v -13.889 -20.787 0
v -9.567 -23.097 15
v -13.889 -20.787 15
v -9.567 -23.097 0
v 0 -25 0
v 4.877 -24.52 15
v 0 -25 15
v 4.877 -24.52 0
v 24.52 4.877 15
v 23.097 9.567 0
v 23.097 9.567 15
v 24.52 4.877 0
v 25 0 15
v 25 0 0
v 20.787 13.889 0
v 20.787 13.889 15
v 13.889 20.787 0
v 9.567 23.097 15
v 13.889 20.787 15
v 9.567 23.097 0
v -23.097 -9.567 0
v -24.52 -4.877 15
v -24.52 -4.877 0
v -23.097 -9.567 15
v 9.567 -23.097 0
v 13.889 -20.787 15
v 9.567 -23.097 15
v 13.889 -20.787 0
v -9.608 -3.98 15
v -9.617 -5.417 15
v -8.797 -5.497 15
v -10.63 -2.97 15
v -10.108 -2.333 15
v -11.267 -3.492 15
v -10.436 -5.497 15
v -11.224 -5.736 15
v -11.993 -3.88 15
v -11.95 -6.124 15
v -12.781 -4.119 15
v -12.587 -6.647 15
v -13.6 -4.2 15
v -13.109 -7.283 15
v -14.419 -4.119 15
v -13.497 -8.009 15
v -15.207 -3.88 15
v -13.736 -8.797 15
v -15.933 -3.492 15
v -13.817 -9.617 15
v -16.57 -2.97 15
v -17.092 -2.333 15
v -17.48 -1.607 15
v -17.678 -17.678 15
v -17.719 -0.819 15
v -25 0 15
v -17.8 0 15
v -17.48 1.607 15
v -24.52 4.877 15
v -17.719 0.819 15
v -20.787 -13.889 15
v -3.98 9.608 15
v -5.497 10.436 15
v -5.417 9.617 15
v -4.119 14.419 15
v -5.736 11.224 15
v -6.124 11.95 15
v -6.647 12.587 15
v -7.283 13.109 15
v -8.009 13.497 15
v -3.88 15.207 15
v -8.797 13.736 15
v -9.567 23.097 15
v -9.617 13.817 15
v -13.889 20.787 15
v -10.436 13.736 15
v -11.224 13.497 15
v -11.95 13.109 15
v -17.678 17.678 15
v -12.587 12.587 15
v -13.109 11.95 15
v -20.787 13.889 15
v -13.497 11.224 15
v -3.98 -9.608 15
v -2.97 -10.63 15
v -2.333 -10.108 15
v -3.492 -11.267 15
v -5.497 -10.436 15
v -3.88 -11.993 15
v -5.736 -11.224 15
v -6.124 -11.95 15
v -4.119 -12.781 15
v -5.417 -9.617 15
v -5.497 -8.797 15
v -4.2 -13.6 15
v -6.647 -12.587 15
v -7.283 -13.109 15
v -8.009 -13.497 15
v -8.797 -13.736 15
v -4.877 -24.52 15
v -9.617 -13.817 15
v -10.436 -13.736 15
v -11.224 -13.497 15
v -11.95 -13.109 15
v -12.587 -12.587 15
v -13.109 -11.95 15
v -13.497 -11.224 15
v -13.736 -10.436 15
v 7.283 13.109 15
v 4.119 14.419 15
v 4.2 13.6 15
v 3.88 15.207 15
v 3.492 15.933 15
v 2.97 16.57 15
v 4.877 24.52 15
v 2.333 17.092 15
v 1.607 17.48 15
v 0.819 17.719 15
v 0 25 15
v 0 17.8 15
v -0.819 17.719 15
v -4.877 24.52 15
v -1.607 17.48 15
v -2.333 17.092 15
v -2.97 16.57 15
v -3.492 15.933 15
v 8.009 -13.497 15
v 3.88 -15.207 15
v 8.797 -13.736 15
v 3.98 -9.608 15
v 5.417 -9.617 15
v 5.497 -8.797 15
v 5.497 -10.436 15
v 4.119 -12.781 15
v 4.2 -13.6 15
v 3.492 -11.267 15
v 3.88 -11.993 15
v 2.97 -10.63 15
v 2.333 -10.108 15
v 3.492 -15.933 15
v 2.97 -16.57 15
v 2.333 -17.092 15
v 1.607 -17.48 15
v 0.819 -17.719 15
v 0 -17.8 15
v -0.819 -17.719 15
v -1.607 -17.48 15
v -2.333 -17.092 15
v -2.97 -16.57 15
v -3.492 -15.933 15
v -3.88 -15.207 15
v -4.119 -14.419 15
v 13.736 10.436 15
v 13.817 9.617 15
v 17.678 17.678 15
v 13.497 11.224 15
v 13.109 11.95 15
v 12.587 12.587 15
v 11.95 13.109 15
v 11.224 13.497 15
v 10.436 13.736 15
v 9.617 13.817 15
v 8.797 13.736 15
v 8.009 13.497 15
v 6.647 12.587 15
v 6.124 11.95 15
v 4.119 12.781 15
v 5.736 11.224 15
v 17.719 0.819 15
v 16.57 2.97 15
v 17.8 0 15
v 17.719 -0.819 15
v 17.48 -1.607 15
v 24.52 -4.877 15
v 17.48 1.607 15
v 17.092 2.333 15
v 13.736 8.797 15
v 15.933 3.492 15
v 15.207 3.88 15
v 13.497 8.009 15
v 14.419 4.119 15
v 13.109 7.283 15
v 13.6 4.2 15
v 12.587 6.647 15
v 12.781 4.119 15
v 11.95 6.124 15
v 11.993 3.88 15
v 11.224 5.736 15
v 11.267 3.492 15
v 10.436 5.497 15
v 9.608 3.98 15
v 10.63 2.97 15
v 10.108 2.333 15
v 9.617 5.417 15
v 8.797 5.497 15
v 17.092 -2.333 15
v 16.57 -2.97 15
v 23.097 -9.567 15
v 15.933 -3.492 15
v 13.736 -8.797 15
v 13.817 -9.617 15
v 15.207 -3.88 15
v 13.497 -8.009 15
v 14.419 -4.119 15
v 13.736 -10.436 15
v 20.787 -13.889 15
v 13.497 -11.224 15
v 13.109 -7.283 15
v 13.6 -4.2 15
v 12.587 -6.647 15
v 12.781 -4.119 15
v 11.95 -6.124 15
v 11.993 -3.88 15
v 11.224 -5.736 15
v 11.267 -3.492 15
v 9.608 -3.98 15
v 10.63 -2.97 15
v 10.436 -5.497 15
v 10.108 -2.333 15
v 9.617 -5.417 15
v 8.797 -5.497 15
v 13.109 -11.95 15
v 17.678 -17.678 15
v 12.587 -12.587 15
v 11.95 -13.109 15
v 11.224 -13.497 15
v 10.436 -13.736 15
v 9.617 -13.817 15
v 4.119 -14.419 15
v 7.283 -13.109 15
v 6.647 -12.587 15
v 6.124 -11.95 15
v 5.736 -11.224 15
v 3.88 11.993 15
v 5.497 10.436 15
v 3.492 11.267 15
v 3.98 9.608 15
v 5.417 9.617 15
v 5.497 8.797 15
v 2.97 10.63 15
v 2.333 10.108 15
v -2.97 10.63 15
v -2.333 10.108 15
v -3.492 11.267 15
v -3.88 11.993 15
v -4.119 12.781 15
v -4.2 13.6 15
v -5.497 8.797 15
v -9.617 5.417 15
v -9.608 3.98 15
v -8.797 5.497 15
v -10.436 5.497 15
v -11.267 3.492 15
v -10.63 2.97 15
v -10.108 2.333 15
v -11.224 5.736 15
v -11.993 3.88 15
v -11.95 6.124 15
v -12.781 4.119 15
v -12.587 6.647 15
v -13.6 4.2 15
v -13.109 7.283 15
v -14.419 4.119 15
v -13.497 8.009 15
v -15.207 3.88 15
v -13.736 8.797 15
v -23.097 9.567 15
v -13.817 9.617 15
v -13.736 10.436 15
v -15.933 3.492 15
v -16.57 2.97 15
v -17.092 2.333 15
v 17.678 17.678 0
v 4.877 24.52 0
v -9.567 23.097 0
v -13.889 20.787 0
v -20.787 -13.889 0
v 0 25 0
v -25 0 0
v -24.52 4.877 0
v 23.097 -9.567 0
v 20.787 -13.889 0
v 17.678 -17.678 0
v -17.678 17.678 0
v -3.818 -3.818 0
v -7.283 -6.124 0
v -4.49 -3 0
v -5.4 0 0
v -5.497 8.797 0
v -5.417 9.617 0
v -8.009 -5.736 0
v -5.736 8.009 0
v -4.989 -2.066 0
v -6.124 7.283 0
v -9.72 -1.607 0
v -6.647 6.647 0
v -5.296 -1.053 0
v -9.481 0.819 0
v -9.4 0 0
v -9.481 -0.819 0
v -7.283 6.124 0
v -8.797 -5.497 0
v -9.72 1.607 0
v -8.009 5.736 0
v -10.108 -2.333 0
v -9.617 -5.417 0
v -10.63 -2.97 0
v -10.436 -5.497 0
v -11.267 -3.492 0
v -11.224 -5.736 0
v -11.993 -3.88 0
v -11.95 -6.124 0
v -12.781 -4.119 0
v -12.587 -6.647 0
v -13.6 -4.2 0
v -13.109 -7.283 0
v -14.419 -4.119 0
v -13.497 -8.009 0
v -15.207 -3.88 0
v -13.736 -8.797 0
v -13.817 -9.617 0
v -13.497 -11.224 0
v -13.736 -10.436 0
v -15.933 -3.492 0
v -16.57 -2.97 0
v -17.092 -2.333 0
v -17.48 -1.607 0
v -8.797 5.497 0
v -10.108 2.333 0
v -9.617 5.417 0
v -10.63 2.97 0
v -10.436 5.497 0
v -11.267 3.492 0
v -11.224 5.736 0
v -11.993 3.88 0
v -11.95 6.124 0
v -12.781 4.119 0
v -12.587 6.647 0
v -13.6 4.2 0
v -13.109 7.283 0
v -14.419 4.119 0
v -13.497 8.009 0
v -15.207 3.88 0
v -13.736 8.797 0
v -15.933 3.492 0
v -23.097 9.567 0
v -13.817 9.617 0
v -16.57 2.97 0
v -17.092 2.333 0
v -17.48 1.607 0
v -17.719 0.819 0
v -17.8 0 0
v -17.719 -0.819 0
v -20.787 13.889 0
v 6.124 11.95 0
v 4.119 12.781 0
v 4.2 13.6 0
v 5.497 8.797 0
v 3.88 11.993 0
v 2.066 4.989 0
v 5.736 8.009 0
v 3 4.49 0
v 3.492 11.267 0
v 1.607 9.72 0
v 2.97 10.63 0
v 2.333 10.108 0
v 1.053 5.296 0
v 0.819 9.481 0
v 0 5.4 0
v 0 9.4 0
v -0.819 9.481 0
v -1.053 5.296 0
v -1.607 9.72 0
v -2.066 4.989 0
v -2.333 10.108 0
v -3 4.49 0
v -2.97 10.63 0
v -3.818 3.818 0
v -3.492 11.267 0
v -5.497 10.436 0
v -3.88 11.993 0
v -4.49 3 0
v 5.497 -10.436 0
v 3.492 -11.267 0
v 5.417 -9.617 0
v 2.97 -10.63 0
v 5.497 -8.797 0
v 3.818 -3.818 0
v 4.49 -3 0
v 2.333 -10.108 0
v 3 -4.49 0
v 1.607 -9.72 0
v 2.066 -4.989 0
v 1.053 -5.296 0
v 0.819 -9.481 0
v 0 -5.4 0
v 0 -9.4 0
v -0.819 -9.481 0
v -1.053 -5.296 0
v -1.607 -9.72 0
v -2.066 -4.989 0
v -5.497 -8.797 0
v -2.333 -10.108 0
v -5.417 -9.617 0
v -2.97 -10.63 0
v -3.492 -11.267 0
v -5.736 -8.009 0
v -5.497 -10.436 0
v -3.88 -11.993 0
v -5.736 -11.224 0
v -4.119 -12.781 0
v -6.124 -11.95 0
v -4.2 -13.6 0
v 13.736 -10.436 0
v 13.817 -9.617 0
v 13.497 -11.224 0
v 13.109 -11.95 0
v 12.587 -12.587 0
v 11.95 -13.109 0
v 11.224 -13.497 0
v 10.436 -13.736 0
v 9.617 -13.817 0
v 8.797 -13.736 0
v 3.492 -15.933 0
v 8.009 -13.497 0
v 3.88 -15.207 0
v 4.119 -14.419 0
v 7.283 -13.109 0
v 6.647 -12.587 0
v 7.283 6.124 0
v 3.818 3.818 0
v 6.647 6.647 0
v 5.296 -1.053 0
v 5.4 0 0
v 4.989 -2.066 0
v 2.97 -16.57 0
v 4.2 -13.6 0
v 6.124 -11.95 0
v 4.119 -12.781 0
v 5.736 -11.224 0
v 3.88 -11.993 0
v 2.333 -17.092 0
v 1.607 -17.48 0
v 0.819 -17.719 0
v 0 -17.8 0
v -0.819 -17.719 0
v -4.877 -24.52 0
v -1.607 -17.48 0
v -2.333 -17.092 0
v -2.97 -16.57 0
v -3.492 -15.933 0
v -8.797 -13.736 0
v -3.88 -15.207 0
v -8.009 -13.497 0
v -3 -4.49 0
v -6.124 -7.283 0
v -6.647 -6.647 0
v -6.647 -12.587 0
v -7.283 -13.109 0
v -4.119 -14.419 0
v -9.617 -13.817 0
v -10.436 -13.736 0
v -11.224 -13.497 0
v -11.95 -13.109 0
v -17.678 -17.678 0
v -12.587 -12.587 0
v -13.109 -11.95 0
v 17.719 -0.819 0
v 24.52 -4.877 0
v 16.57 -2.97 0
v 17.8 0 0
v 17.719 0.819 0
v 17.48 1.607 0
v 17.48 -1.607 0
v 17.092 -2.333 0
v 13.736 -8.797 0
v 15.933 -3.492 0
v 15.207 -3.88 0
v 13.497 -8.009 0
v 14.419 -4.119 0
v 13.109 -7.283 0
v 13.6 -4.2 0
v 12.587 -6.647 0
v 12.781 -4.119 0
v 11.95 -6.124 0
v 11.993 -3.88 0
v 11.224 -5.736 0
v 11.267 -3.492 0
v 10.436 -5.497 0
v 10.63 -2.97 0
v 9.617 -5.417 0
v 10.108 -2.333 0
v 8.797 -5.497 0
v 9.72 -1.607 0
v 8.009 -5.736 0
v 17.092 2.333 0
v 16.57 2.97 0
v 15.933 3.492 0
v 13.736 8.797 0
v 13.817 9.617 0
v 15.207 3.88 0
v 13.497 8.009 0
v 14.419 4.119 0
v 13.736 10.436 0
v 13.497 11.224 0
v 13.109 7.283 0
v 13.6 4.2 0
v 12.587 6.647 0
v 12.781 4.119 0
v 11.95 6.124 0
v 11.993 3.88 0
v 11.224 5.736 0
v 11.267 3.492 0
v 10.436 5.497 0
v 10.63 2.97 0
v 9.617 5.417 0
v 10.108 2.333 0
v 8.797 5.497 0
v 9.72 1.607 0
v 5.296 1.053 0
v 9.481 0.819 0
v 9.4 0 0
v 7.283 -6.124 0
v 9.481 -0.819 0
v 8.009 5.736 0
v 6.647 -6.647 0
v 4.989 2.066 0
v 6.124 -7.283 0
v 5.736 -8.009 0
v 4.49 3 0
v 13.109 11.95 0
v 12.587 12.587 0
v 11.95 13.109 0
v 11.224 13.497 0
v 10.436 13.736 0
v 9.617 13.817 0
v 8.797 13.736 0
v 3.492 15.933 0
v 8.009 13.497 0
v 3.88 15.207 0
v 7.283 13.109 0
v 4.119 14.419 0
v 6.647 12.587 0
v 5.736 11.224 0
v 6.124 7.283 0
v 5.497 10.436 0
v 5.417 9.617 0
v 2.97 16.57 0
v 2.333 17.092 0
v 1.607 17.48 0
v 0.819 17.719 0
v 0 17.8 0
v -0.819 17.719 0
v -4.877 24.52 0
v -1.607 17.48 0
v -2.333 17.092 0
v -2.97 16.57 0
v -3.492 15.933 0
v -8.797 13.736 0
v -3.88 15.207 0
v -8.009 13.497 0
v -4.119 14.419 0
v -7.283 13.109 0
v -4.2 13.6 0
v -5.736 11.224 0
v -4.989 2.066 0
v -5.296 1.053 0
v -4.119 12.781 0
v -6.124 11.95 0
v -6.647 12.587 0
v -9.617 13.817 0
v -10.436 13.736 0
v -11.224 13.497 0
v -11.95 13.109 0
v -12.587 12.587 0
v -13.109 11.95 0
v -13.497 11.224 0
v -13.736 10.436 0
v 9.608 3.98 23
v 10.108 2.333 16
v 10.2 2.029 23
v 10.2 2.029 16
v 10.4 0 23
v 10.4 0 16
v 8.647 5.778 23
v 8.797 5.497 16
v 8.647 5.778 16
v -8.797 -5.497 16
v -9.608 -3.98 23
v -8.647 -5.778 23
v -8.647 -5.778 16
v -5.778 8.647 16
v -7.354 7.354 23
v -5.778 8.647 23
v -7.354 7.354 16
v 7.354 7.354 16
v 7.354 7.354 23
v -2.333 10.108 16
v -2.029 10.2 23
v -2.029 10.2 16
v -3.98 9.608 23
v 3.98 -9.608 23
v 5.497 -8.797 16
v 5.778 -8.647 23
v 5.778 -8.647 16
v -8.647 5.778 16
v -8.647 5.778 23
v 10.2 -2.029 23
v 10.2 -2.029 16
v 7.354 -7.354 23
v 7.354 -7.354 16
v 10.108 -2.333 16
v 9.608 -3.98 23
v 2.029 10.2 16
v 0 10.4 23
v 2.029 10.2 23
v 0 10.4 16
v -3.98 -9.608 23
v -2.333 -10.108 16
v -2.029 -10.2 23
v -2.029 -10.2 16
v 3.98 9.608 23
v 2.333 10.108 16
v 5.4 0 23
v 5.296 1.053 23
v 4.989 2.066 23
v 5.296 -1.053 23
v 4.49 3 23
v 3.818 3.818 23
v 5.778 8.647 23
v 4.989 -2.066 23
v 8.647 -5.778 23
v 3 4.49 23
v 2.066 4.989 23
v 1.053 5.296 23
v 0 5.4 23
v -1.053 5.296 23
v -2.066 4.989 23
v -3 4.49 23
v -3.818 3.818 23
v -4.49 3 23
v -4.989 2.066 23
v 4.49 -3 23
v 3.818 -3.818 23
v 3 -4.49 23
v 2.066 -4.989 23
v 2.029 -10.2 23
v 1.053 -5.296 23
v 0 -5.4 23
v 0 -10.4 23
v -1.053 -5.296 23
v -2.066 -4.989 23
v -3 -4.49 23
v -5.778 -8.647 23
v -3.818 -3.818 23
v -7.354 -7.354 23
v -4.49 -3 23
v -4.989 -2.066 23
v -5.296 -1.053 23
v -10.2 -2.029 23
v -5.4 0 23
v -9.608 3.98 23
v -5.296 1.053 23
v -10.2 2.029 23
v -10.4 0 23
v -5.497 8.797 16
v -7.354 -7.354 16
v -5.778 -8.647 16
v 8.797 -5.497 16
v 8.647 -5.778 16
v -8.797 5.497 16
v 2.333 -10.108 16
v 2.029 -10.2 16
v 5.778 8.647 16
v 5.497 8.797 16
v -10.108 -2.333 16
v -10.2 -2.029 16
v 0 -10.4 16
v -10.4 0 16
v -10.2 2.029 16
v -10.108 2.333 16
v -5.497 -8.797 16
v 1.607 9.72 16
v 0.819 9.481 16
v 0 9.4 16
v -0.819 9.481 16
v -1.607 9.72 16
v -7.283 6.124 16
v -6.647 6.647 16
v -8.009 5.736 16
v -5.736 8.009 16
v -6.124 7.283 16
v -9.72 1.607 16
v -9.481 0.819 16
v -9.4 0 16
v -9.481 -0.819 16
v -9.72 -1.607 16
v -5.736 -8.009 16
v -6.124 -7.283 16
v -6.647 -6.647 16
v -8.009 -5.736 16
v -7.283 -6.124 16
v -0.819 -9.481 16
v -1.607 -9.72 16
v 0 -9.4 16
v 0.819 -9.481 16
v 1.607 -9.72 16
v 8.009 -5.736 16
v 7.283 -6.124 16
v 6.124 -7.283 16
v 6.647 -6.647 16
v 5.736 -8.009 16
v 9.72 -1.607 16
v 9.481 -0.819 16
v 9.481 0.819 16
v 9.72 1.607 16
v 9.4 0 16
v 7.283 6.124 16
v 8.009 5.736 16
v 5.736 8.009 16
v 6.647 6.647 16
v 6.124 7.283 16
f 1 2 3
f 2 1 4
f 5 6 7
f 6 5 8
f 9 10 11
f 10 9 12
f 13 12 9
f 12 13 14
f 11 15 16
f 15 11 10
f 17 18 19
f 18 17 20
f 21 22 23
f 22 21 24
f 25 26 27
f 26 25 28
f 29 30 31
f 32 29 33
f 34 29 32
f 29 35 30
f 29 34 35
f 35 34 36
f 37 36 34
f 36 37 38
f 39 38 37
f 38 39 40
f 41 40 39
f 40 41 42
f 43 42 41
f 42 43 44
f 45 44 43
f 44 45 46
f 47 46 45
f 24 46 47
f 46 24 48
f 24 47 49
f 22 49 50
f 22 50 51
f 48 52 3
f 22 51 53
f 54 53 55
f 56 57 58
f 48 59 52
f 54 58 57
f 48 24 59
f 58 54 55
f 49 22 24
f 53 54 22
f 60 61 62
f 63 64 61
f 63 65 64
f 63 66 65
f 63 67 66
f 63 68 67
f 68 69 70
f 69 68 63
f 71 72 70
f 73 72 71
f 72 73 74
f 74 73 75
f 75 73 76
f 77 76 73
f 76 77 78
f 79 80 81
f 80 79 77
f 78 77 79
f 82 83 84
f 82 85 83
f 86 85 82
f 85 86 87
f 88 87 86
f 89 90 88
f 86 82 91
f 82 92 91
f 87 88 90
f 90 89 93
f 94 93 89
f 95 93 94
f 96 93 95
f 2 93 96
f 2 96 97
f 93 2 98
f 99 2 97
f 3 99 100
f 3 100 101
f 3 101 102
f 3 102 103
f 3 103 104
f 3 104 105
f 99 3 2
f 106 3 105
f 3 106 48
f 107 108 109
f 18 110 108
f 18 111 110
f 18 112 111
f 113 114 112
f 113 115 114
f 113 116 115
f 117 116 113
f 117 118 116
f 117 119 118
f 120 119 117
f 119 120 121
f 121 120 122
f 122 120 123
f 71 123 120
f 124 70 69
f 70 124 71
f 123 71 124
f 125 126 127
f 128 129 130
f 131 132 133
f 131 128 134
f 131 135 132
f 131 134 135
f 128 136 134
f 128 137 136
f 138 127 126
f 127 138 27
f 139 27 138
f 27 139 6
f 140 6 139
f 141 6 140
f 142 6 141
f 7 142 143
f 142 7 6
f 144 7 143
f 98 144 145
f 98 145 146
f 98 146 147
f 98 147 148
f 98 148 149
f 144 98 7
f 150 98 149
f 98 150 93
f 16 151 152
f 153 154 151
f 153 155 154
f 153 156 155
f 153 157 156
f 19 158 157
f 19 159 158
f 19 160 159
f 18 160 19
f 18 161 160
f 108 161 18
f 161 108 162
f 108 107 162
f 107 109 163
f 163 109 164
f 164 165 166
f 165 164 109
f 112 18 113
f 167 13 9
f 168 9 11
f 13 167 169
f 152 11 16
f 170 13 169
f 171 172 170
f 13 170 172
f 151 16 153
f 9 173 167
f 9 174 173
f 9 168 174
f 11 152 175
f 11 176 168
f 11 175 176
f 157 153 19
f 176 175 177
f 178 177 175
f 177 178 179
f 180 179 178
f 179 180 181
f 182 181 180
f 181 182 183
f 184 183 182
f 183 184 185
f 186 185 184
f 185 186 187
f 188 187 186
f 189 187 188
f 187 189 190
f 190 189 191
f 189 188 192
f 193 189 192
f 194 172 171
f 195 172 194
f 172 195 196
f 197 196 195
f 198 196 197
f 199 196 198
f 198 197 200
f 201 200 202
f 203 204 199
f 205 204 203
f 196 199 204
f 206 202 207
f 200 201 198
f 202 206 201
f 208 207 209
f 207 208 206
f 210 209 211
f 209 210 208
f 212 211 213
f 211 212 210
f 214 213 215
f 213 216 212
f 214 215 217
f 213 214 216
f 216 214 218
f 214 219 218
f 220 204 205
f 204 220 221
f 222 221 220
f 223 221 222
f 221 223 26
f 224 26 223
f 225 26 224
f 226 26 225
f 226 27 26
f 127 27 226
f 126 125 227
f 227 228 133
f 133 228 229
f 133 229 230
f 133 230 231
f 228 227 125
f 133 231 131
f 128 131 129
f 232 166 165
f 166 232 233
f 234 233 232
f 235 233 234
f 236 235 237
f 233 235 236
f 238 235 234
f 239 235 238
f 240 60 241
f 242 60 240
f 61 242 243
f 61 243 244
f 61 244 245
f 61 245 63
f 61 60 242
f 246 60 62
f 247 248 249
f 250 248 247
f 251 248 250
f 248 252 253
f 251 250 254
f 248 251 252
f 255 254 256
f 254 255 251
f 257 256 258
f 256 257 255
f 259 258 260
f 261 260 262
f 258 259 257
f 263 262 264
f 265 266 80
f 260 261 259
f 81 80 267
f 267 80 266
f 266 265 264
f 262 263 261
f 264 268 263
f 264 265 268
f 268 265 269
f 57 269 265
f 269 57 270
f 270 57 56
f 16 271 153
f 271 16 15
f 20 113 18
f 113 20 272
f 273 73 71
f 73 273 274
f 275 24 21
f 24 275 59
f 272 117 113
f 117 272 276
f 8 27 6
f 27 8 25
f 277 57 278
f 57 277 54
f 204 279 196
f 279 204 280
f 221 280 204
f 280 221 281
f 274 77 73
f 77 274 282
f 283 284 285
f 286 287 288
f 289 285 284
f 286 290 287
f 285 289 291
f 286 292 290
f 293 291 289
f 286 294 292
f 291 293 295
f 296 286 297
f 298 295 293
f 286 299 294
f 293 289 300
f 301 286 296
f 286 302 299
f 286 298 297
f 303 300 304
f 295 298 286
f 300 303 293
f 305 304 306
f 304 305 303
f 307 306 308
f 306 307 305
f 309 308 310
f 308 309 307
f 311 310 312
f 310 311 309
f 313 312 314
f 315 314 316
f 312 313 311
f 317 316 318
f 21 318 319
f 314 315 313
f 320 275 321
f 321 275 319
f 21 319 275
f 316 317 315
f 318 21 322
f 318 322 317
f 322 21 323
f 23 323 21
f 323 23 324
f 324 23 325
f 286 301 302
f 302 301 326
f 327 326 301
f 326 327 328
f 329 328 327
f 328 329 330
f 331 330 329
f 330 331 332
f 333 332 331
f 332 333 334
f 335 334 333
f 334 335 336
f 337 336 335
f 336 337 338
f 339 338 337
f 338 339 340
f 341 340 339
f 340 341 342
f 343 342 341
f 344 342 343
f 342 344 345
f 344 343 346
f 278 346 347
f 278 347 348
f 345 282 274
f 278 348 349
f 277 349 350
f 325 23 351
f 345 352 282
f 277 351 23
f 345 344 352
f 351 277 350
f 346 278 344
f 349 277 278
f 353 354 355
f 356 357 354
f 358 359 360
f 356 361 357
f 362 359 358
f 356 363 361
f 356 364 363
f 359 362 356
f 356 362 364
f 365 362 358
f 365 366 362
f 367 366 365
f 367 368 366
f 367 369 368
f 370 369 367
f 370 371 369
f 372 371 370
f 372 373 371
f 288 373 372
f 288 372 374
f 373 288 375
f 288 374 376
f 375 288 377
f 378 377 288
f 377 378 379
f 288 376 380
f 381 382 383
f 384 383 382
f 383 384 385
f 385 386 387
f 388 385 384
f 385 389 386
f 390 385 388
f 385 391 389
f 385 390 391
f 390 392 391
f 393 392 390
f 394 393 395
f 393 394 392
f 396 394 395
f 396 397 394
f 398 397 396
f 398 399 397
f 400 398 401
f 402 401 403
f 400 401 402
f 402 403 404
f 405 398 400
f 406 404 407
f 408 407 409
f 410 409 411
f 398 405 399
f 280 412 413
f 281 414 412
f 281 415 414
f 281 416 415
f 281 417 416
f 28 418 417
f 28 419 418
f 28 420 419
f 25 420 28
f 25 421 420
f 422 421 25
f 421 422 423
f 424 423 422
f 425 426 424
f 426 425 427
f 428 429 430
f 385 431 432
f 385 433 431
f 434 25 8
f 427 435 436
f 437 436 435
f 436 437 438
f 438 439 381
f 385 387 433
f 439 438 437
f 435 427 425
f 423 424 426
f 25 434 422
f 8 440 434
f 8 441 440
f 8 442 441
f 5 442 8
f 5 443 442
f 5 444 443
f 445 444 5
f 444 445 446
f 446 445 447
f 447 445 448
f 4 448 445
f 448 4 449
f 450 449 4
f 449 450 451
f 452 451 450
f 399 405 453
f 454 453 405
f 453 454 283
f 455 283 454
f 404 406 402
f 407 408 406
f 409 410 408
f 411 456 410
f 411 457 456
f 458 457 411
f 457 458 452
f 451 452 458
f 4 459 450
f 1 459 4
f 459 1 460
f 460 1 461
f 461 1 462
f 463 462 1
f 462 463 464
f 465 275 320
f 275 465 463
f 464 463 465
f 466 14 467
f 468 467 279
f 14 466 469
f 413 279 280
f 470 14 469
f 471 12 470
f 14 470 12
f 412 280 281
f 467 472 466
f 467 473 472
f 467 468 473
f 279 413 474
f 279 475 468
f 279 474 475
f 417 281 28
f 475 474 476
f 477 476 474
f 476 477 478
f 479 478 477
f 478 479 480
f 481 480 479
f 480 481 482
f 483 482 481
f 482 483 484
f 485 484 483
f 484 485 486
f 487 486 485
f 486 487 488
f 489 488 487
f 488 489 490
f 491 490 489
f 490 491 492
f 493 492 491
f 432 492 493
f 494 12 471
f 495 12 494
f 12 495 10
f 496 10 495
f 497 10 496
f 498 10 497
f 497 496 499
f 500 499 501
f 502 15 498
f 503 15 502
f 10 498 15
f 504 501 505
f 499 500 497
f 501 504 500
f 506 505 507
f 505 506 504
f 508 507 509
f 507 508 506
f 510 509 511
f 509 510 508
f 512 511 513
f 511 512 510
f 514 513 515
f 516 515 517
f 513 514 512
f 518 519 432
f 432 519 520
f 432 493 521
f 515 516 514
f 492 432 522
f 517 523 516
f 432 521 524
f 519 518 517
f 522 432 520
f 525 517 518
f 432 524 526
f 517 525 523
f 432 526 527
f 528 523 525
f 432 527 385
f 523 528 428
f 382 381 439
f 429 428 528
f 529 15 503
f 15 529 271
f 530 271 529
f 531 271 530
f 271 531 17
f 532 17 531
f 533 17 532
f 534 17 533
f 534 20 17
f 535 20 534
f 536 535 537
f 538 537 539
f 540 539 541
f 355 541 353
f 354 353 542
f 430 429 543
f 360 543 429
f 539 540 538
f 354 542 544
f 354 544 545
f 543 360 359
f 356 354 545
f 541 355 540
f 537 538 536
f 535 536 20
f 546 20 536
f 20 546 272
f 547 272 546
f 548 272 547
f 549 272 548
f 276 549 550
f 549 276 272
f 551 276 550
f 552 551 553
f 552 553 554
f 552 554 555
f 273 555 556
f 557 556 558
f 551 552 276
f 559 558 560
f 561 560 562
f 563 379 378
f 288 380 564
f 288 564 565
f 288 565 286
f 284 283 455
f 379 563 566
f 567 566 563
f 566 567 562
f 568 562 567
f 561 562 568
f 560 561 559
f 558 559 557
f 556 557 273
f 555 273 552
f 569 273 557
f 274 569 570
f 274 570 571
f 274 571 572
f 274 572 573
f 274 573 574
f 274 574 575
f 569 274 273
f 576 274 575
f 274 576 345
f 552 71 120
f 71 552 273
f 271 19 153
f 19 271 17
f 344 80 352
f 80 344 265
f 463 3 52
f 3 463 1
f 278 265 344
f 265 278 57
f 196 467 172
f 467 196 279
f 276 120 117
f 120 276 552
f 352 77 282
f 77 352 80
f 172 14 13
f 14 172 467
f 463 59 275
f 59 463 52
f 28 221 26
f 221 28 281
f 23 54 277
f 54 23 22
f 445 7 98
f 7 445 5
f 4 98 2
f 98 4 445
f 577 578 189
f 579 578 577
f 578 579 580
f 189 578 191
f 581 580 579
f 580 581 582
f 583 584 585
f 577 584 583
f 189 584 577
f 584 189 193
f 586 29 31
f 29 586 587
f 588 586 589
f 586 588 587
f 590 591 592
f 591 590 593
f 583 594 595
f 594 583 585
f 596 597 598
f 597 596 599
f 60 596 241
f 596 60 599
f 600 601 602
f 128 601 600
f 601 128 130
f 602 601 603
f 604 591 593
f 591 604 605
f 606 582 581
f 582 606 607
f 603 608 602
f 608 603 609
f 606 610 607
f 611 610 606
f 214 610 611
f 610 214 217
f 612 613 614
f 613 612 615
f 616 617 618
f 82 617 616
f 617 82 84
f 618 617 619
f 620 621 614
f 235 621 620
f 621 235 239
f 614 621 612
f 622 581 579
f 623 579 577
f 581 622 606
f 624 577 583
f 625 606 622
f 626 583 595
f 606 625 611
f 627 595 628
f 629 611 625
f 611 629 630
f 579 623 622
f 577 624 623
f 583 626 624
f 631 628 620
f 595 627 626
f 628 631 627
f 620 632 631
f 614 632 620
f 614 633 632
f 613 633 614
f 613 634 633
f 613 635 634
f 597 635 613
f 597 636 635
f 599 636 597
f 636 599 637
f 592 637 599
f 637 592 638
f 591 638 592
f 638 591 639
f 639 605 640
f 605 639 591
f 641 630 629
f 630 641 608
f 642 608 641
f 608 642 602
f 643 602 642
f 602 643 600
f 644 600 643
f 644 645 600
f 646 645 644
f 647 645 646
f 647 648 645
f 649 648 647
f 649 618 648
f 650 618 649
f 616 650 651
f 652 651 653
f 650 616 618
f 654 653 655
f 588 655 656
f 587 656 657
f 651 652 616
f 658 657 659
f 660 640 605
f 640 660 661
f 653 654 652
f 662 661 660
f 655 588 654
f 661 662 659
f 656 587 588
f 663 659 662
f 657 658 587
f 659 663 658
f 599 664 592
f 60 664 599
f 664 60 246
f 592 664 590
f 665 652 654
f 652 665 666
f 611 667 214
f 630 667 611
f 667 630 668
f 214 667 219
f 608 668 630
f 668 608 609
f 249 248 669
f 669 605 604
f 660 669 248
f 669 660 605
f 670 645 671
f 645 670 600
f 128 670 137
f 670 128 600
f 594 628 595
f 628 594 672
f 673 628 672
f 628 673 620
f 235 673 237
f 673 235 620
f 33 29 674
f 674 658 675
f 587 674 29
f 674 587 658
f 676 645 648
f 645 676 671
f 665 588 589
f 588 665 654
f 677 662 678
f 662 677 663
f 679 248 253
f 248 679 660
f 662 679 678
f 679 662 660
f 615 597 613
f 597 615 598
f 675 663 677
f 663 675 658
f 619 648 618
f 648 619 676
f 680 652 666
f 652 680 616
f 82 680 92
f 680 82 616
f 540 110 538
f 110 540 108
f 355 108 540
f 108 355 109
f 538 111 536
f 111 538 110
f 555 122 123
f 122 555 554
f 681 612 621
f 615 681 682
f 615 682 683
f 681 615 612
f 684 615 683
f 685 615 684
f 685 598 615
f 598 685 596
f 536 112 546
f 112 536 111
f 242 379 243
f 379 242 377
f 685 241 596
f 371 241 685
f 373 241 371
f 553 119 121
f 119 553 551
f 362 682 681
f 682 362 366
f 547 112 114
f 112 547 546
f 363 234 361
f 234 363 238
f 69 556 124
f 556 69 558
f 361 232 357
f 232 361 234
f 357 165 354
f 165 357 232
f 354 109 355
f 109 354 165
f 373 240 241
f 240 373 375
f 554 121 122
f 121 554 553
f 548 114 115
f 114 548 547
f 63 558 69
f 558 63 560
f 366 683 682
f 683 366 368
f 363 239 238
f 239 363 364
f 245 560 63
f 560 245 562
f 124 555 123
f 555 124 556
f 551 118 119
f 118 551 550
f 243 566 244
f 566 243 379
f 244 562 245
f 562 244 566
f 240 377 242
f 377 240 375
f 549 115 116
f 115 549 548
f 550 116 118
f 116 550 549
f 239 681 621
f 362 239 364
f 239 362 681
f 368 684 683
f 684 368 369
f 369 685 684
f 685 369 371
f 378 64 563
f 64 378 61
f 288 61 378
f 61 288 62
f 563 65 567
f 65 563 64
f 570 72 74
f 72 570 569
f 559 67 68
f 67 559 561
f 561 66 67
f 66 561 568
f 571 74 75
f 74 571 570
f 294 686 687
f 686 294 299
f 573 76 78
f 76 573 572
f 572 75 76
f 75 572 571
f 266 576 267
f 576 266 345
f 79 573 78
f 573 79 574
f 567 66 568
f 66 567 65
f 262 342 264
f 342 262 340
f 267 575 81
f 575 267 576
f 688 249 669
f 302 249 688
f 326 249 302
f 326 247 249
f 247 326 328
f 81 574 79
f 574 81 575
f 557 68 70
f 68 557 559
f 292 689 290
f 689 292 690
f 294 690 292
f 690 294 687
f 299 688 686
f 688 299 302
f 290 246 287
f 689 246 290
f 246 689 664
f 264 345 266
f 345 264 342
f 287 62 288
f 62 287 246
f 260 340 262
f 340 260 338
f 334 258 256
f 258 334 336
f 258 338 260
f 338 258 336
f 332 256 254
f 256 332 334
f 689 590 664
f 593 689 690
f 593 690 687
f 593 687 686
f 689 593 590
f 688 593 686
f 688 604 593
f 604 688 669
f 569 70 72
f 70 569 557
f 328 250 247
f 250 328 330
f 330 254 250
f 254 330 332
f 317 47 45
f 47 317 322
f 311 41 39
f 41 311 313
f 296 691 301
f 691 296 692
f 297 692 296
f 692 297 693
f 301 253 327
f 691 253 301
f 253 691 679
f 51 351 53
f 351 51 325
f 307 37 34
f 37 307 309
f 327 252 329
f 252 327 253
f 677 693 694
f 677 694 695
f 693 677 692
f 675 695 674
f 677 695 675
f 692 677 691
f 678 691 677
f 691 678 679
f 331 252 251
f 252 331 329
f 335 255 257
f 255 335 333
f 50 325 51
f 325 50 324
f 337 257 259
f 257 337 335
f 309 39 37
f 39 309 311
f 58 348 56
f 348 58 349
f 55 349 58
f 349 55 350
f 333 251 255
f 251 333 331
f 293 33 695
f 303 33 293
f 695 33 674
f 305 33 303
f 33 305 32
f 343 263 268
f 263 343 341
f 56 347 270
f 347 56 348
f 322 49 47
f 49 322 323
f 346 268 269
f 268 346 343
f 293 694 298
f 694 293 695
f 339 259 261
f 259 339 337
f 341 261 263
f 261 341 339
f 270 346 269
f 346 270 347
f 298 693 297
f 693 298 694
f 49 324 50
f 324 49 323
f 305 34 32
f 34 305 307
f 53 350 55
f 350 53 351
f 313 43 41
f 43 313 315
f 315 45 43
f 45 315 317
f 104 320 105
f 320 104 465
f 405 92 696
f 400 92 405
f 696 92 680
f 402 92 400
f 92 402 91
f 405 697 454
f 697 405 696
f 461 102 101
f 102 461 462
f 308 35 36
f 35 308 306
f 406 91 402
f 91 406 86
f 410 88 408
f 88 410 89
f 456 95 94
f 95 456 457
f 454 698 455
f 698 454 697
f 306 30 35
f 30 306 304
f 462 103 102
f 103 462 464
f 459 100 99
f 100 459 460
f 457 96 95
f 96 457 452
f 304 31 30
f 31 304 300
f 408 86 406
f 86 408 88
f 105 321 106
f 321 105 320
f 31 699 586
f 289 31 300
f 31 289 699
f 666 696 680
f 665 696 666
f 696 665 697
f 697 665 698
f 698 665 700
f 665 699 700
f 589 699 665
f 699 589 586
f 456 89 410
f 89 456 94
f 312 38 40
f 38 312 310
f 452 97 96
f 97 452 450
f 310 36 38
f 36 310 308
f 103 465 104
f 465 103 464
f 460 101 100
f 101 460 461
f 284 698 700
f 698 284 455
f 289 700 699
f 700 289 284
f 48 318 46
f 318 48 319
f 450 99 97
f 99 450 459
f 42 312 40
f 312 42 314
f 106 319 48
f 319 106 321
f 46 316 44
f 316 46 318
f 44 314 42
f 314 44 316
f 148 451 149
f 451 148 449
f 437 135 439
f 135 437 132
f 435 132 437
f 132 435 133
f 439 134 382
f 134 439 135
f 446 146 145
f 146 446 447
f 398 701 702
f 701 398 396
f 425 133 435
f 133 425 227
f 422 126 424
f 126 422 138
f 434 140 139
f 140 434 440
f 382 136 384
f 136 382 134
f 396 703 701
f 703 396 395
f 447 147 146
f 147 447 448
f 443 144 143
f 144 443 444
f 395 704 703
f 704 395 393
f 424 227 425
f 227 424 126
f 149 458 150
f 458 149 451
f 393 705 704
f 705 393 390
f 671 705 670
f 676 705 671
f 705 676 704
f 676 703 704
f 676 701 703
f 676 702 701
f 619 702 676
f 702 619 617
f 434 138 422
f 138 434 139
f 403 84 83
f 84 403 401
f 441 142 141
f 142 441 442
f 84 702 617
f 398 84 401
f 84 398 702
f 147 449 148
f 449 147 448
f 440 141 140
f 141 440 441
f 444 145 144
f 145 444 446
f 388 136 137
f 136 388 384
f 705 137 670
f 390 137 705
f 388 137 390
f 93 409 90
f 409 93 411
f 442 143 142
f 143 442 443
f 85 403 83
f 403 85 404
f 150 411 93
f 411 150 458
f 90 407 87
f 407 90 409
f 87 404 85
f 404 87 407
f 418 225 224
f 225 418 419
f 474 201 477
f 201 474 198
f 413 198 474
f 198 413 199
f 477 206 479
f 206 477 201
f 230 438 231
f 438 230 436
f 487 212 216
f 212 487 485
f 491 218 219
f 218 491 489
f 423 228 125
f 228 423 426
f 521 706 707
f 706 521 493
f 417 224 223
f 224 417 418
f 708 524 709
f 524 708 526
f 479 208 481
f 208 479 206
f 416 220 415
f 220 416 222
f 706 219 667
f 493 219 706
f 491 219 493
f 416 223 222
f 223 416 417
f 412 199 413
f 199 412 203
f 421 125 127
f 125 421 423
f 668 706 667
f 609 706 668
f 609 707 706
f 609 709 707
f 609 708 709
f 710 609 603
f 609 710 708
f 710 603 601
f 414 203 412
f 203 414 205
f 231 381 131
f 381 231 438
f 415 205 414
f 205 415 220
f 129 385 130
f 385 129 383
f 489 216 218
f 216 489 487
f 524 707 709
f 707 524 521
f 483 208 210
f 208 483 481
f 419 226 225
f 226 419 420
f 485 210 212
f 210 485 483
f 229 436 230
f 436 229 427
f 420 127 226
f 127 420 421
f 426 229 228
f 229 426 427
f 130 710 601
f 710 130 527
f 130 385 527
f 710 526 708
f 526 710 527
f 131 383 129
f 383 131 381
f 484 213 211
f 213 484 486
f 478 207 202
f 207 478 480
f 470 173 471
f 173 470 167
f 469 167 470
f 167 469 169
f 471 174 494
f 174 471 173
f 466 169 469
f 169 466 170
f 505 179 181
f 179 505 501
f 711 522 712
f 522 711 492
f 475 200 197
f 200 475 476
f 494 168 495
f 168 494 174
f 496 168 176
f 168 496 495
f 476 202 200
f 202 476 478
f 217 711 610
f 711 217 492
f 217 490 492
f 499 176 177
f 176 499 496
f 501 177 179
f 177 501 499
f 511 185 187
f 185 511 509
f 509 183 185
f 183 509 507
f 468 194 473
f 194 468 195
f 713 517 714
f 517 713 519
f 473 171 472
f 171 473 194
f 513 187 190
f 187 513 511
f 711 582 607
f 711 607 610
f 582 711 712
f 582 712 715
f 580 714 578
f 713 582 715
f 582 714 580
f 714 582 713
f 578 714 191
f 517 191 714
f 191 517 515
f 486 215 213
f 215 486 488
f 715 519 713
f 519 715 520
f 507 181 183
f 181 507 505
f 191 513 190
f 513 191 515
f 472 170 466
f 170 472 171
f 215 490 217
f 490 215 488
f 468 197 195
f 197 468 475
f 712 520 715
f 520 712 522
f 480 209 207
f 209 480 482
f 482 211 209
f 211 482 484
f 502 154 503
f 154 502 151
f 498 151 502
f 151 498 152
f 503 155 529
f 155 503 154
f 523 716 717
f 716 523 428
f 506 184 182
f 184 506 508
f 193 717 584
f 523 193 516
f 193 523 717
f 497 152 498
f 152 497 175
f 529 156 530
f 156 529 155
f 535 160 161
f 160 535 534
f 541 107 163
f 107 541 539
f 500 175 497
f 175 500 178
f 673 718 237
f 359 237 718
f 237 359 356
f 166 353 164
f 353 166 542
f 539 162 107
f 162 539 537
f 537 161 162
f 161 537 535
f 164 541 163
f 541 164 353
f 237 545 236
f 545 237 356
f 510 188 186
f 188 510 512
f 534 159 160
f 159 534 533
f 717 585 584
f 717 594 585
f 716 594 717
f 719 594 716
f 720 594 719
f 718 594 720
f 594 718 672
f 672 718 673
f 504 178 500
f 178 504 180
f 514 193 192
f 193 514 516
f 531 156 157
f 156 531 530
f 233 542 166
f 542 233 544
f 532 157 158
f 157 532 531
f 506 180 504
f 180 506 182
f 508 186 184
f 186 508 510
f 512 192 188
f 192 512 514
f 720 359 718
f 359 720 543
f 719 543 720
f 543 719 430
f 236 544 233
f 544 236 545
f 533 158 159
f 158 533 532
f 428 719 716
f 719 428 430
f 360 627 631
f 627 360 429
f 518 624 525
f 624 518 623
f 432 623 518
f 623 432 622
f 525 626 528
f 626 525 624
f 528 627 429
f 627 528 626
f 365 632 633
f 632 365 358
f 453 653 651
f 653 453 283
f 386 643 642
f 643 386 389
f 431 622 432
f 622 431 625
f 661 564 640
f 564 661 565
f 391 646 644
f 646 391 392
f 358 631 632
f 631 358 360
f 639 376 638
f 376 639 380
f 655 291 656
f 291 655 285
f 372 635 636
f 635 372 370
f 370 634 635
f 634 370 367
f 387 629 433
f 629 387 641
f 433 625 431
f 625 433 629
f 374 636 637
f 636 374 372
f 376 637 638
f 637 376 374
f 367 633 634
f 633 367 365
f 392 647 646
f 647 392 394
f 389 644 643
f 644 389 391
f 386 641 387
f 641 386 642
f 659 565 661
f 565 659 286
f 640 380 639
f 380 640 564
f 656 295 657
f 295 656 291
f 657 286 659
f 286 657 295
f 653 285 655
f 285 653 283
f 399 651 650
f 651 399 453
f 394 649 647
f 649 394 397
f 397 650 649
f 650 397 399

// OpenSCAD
$fn = 32;

// ----------------------------------------------------------------------
// Flange Ø50 x 15
// 8 holes on a Ø27.2 bolt circle, bolted joints
// ----------------------------------------------------------------------

// --- parameters (mm) ---
flange_d = 50;   // outside diameter of the flange
thickness = 15;  // flange thickness
holes = 8;       // number of bolt holes
pcd = 27.2;      // bolt circle diameter
start_deg = 90;  // angle of the first hole, from +X
hole_d = 8.4;    // bolt hole diameter
bore_d = 10.8;   // central through bore
hub_d = 20.8;    // hub outside diameter
hub_h = 8;       // hub height above the flange face (0 = no hub)

// --- derived feature positions (mm) ---
height = thickness + hub_h;  // = 23   overall height of the part
pcd_r = pcd / 2;             // = 13.6   bolt circle radius
hole_step = 360 / holes;     // = 45   angular pitch
feature_centers = [
  [pcd_r * cos(start_deg + 0 * hole_step), pcd_r * sin(start_deg + 0 * hole_step)],
  [pcd_r * cos(start_deg + 1 * hole_step), pcd_r * sin(start_deg + 1 * hole_step)],
  [pcd_r * cos(start_deg + 2 * hole_step), pcd_r * sin(start_deg + 2 * hole_step)],
  [pcd_r * cos(start_deg + 3 * hole_step), pcd_r * sin(start_deg + 3 * hole_step)],
  [pcd_r * cos(start_deg + 4 * hole_step), pcd_r * sin(start_deg + 4 * hole_step)],
  [pcd_r * cos(start_deg + 5 * hole_step), pcd_r * sin(start_deg + 5 * hole_step)],
  [pcd_r * cos(start_deg + 6 * hole_step), pcd_r * sin(start_deg + 6 * hole_step)],
  [pcd_r * cos(start_deg + 7 * hole_step), pcd_r * sin(start_deg + 7 * hole_step)]
];   // bolt hole centres on the pitch circle

// flange disc, every hole and the bore cut straight through
difference() {
  union() {
    cylinder(d = flange_d, h = thickness);
    cylinder(d = hub_d, h = height);  // hub, overlapped into the flange
  }
  translate([0, 0, -1]) cylinder(d = bore_d, h = height + 2);  // bore, through
  for (centre = feature_centers)
    translate([centre[0], centre[1], -1]) cylinder(d = hole_d, h = thickness + 2);
}
